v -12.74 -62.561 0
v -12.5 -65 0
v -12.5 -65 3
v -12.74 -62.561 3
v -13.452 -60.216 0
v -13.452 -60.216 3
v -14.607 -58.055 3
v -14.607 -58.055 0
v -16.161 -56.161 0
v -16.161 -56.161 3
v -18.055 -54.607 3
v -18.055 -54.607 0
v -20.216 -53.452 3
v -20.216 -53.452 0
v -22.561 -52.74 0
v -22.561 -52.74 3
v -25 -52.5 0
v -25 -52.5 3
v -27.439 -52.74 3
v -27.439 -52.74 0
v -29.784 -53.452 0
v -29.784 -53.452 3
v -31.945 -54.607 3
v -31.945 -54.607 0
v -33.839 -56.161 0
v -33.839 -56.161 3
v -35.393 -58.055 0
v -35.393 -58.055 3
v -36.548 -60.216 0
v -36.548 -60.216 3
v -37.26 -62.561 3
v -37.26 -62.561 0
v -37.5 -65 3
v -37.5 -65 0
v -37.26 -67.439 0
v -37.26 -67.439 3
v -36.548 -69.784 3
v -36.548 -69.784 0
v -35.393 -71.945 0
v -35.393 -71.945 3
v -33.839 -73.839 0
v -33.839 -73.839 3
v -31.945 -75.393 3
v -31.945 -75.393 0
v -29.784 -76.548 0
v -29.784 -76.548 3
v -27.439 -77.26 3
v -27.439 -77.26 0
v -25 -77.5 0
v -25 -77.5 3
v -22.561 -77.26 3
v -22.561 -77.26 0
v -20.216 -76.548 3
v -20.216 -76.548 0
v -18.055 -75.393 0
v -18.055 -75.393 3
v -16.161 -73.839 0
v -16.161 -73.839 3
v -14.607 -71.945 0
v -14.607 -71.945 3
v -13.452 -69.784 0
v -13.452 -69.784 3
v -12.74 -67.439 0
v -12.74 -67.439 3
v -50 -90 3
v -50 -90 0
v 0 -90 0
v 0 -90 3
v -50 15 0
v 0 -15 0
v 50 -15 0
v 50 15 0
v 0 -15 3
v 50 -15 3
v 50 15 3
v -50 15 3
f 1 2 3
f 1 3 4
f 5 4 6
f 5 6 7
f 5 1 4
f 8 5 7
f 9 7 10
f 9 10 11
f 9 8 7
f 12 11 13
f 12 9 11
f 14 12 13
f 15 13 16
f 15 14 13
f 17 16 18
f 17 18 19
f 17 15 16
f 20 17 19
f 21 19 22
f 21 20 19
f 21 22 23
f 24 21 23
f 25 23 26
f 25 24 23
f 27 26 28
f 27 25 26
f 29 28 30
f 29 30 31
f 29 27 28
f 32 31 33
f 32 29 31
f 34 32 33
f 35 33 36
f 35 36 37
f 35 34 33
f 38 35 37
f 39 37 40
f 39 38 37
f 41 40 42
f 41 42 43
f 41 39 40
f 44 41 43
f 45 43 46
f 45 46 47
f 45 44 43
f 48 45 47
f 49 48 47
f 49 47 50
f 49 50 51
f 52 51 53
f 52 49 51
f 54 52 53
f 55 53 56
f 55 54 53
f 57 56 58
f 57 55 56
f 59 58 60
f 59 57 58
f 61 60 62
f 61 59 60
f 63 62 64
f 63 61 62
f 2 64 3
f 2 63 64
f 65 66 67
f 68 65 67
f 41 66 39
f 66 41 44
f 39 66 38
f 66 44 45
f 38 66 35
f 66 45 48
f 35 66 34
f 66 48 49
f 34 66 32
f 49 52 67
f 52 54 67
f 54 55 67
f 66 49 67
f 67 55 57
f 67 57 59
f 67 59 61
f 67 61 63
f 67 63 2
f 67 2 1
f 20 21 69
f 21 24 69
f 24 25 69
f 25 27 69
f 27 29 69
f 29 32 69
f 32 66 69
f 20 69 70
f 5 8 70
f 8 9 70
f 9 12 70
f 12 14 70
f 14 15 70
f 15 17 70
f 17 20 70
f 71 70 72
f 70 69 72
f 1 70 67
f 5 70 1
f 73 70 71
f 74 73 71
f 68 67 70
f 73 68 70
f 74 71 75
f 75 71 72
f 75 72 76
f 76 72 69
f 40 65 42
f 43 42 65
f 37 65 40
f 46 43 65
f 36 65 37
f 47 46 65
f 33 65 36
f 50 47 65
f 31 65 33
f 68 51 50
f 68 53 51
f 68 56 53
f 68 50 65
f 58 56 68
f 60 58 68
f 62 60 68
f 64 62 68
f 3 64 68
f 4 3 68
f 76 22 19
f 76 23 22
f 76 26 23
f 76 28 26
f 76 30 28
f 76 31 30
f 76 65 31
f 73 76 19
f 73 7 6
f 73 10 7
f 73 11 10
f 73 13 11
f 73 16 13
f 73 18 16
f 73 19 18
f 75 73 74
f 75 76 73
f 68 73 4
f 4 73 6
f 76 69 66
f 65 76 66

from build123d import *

# Parameters (mm, degrees)
SKETCH1_W           = 50
SKETCH1_H           = 75
SKETCH1_R           = 12.5
BOSS_EXTRUDE1_DEPTH = 3


with BuildPart() as part:
    # Sketch1 → Boss-Extrude1 (new body)
    with BuildSketch(Plane.XY):
        Polygon((-50, 15), (-50, -15), (0, -15), (50, -15), (50, 15), align=None)
        with Locations((-25, -52.5)):
            Rectangle(SKETCH1_W, SKETCH1_H)
        with Locations((-25, -65)):
            Circle(SKETCH1_R, mode=Mode.SUBTRACT)
    extrude(amount=BOSS_EXTRUDE1_DEPTH)


solid = part.part
